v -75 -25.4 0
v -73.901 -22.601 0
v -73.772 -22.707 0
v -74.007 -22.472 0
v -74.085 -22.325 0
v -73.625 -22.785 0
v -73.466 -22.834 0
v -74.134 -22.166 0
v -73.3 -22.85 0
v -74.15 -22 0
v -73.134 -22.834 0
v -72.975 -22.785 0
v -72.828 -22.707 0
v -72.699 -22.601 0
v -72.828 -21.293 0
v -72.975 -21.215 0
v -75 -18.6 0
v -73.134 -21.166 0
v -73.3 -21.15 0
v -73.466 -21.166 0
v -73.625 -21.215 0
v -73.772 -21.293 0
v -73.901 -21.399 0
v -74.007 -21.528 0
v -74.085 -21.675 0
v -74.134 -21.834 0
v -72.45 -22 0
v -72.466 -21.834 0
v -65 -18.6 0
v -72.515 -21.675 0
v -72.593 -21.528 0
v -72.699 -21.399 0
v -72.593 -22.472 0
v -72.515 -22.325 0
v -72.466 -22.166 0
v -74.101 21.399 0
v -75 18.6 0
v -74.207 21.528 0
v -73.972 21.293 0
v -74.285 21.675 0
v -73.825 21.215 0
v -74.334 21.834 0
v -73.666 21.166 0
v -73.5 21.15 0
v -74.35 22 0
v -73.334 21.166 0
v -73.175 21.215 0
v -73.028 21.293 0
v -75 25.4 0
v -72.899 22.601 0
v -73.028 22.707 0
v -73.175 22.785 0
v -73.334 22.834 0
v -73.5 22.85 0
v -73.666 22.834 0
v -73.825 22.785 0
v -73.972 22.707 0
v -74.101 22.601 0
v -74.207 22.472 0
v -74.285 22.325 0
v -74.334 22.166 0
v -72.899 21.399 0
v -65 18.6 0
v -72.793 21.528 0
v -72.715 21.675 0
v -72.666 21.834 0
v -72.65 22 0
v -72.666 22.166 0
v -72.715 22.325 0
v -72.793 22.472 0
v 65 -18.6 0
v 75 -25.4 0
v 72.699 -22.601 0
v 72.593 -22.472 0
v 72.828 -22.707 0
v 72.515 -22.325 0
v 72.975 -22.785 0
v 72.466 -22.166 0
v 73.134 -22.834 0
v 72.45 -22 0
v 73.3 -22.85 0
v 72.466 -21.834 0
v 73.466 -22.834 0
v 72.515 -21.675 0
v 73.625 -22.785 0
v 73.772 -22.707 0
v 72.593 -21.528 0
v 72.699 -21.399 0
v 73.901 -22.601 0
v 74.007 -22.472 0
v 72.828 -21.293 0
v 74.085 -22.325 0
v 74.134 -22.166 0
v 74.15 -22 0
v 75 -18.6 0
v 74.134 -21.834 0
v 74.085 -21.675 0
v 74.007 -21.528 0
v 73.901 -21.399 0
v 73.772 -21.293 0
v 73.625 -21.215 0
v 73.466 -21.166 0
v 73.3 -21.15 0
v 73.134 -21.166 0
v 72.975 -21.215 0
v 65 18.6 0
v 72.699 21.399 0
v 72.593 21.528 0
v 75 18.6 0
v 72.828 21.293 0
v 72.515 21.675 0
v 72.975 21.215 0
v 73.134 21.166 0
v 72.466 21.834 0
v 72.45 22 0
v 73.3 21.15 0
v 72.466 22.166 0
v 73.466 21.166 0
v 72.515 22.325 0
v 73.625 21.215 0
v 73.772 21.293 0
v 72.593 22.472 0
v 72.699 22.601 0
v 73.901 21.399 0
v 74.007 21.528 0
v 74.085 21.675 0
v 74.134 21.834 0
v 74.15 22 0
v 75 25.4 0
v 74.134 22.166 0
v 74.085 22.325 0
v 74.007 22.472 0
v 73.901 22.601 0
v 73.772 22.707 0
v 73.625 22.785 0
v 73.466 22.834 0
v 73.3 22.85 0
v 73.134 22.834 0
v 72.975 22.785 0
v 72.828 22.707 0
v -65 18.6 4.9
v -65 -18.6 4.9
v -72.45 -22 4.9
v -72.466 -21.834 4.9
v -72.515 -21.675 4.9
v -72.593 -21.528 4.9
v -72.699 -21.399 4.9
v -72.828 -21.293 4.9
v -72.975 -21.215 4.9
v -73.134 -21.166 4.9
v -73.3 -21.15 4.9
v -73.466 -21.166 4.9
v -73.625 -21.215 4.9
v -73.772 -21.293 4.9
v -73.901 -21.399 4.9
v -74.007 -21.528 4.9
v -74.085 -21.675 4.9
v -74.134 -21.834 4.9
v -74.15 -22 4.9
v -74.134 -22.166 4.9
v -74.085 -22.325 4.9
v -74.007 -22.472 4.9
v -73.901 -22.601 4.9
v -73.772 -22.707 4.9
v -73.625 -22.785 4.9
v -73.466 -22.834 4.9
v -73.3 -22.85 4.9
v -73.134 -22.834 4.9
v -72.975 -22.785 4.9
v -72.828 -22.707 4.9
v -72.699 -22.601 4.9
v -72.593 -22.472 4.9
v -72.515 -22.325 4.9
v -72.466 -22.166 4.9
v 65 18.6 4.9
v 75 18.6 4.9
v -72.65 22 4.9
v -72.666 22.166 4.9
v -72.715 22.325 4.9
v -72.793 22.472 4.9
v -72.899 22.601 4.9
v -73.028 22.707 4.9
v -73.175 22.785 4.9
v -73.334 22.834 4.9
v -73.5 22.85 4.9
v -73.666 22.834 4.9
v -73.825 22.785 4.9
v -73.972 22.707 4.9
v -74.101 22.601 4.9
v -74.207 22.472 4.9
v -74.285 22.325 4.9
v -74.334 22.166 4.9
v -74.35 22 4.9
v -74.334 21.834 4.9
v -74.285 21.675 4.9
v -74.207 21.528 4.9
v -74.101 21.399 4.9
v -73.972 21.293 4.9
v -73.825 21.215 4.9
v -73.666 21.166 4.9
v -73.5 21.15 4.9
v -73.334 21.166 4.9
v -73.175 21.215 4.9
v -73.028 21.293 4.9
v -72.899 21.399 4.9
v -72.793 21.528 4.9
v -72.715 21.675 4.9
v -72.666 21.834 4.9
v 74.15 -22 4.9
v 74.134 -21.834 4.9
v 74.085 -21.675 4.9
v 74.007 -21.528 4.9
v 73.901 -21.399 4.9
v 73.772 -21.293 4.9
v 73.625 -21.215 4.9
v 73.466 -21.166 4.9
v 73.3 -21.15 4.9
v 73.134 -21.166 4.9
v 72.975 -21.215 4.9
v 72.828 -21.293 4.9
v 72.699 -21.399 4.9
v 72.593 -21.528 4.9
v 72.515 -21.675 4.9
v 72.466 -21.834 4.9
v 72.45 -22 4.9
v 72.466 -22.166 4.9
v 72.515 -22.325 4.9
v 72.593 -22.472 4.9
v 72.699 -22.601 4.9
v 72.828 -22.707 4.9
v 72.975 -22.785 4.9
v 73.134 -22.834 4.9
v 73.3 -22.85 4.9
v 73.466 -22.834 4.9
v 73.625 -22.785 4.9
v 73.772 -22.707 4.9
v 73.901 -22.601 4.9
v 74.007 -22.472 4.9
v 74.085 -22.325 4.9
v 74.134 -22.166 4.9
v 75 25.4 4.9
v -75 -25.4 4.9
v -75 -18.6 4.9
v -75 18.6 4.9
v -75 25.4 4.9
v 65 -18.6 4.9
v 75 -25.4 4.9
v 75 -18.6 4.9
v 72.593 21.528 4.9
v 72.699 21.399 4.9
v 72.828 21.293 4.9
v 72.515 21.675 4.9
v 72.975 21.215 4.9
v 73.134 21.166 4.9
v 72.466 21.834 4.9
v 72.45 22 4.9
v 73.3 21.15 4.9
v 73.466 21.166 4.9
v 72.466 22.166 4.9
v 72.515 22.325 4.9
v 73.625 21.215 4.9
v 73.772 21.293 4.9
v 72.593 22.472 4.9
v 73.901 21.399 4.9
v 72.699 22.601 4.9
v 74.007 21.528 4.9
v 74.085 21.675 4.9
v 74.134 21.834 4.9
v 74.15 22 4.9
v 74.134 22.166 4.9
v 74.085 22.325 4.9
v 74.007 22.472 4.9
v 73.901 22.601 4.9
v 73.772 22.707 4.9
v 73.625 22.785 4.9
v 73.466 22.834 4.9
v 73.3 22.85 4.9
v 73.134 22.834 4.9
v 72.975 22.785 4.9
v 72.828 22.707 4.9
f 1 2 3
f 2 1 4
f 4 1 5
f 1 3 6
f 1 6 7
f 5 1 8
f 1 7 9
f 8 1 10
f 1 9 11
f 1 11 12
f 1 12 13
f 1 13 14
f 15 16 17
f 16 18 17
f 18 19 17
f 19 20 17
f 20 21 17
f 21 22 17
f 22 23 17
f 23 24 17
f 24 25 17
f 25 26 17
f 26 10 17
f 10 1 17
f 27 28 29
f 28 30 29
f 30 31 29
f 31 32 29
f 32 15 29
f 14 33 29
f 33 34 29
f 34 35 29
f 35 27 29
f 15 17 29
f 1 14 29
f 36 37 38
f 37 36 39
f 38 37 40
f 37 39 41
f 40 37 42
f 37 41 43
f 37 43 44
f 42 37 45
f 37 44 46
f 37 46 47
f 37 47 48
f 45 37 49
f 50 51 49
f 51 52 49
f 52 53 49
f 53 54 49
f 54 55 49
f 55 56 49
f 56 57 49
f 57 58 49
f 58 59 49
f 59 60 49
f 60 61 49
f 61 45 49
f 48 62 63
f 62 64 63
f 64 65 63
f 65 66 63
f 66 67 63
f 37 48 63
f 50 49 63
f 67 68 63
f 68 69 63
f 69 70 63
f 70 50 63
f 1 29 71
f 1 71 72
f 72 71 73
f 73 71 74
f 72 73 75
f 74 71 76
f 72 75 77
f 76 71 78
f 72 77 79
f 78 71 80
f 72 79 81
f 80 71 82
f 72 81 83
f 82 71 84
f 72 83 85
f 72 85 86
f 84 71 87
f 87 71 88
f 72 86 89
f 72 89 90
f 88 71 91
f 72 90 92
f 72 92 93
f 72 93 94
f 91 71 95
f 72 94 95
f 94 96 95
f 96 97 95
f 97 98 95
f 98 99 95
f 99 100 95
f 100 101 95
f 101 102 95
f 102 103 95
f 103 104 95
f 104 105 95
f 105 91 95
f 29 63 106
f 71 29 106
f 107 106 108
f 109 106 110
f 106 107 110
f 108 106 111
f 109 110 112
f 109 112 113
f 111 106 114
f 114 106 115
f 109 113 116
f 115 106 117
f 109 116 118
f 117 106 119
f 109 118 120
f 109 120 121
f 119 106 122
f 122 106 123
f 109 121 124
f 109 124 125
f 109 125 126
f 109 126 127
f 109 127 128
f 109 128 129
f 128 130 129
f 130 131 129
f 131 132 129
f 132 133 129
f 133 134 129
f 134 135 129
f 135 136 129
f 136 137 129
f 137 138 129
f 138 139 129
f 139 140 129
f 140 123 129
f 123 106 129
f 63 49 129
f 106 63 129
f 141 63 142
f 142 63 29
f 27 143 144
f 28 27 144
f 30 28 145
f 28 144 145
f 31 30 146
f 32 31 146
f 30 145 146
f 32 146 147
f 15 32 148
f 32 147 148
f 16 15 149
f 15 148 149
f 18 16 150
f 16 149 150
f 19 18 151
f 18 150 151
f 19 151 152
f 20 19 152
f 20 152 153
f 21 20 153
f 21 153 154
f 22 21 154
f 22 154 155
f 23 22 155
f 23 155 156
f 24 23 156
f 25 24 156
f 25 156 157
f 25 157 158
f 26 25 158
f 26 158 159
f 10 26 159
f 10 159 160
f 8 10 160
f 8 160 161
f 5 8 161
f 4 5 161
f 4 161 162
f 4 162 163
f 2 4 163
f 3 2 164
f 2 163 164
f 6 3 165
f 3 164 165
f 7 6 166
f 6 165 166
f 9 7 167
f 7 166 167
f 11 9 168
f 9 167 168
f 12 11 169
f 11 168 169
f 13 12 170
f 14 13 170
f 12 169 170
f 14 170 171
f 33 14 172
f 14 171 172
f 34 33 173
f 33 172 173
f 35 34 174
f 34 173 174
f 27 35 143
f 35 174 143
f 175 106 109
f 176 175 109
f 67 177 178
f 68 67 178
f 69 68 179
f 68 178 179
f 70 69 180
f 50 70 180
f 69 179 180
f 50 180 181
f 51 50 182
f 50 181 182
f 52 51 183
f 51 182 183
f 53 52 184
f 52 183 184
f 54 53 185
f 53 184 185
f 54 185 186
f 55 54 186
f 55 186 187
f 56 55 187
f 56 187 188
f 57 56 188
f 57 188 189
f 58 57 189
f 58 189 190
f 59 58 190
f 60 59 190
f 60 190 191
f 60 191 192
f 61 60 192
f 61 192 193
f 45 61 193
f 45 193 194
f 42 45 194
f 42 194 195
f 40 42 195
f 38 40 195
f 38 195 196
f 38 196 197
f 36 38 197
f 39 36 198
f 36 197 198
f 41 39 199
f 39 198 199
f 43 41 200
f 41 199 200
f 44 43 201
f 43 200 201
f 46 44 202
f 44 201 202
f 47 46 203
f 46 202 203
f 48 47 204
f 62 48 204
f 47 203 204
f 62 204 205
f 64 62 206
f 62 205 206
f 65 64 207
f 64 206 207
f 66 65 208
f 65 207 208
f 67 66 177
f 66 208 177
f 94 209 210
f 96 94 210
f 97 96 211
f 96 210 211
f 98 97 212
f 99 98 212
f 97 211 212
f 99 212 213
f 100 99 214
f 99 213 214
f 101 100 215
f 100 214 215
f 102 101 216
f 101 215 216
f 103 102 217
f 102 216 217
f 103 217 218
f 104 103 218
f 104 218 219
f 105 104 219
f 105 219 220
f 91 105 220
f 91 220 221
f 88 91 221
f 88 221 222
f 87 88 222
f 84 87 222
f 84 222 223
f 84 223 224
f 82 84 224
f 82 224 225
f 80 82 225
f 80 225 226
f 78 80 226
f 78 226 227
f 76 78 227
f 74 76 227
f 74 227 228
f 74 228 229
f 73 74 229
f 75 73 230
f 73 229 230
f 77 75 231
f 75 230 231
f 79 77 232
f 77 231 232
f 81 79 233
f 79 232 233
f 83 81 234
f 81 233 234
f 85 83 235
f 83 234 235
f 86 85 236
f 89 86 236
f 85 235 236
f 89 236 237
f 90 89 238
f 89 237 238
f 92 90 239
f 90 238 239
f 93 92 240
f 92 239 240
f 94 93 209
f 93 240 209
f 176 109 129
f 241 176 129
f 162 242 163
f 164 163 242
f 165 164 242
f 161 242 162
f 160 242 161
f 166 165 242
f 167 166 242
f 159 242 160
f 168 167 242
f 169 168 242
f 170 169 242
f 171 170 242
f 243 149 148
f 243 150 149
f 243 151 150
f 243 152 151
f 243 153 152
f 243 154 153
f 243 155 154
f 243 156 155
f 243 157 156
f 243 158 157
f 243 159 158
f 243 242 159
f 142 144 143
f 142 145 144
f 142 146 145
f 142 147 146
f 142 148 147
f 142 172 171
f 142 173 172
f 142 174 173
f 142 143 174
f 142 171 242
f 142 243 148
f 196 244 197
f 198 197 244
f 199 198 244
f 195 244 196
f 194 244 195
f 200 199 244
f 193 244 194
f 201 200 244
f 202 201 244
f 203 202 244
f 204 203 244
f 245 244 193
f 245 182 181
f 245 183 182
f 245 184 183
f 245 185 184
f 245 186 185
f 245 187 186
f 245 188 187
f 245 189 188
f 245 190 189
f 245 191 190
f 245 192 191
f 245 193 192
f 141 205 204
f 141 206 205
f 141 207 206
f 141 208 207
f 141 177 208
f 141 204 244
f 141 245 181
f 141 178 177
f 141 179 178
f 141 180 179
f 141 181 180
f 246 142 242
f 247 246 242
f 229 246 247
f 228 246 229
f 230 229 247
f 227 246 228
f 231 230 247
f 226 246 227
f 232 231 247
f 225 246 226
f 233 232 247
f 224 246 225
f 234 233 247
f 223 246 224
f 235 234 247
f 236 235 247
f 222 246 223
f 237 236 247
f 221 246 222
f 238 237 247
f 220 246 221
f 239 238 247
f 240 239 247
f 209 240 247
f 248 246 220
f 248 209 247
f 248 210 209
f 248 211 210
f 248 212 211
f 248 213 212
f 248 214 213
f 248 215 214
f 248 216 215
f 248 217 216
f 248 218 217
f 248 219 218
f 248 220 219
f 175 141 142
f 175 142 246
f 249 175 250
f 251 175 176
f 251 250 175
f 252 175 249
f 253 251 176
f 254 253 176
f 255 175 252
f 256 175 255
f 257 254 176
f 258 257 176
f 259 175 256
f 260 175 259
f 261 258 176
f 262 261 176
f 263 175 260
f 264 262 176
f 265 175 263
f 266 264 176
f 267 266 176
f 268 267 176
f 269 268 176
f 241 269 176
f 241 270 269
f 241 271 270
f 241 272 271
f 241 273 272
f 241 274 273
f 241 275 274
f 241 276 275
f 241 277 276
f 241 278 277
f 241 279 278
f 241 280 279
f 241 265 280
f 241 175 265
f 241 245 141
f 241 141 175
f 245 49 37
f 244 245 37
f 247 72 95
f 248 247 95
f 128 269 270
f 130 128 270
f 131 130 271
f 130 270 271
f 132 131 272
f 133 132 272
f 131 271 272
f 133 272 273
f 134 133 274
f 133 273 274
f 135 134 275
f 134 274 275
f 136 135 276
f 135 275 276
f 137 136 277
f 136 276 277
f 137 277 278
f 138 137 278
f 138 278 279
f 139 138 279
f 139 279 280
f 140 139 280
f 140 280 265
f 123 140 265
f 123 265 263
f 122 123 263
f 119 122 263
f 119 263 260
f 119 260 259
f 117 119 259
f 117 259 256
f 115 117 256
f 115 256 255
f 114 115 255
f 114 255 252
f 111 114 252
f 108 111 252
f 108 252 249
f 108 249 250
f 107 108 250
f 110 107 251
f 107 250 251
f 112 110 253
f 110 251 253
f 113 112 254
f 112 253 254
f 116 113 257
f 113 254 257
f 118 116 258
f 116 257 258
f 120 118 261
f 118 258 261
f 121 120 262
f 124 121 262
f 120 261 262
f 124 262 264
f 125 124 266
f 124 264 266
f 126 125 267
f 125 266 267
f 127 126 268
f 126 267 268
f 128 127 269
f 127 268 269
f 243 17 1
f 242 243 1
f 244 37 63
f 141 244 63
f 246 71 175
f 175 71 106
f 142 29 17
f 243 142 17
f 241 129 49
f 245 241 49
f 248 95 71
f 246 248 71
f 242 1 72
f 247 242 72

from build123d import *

# Parameters (mm, degrees)
F1_DEPTH = 4.9
F2_R     = 0.85
F3_DEPTH = 4.901


with BuildPart() as f1:
    # F0 (on Top) → F1 (new body)
    with BuildSketch(Plane.XY):
        Polygon((-75, -25.4), (75, -25.4), (75, -18.6), (65, -18.6), (65, 18.6), (75, 18.6), (75, 25.4), (-75, 25.4), (-75, 18.6), (-65, 18.6), (-65, -18.6), (-75, -18.6), align=None)
    extrude(amount=F1_DEPTH)

    # F2 (on face) → F3 (cut, through all)
    with BuildSketch(Plane.XY.offset(4.9)):
        with Locations((-73.5, 22)):
            Circle(F2_R)
        with Locations((-73.3, -22)):
            Circle(F2_R)
        with Locations((73.3, 22)):
            Circle(F2_R)
        with Locations((73.3, -22)):
            Circle(F2_R)
    extrude(amount=-F3_DEPTH, mode=Mode.SUBTRACT)


solid = f1.part
